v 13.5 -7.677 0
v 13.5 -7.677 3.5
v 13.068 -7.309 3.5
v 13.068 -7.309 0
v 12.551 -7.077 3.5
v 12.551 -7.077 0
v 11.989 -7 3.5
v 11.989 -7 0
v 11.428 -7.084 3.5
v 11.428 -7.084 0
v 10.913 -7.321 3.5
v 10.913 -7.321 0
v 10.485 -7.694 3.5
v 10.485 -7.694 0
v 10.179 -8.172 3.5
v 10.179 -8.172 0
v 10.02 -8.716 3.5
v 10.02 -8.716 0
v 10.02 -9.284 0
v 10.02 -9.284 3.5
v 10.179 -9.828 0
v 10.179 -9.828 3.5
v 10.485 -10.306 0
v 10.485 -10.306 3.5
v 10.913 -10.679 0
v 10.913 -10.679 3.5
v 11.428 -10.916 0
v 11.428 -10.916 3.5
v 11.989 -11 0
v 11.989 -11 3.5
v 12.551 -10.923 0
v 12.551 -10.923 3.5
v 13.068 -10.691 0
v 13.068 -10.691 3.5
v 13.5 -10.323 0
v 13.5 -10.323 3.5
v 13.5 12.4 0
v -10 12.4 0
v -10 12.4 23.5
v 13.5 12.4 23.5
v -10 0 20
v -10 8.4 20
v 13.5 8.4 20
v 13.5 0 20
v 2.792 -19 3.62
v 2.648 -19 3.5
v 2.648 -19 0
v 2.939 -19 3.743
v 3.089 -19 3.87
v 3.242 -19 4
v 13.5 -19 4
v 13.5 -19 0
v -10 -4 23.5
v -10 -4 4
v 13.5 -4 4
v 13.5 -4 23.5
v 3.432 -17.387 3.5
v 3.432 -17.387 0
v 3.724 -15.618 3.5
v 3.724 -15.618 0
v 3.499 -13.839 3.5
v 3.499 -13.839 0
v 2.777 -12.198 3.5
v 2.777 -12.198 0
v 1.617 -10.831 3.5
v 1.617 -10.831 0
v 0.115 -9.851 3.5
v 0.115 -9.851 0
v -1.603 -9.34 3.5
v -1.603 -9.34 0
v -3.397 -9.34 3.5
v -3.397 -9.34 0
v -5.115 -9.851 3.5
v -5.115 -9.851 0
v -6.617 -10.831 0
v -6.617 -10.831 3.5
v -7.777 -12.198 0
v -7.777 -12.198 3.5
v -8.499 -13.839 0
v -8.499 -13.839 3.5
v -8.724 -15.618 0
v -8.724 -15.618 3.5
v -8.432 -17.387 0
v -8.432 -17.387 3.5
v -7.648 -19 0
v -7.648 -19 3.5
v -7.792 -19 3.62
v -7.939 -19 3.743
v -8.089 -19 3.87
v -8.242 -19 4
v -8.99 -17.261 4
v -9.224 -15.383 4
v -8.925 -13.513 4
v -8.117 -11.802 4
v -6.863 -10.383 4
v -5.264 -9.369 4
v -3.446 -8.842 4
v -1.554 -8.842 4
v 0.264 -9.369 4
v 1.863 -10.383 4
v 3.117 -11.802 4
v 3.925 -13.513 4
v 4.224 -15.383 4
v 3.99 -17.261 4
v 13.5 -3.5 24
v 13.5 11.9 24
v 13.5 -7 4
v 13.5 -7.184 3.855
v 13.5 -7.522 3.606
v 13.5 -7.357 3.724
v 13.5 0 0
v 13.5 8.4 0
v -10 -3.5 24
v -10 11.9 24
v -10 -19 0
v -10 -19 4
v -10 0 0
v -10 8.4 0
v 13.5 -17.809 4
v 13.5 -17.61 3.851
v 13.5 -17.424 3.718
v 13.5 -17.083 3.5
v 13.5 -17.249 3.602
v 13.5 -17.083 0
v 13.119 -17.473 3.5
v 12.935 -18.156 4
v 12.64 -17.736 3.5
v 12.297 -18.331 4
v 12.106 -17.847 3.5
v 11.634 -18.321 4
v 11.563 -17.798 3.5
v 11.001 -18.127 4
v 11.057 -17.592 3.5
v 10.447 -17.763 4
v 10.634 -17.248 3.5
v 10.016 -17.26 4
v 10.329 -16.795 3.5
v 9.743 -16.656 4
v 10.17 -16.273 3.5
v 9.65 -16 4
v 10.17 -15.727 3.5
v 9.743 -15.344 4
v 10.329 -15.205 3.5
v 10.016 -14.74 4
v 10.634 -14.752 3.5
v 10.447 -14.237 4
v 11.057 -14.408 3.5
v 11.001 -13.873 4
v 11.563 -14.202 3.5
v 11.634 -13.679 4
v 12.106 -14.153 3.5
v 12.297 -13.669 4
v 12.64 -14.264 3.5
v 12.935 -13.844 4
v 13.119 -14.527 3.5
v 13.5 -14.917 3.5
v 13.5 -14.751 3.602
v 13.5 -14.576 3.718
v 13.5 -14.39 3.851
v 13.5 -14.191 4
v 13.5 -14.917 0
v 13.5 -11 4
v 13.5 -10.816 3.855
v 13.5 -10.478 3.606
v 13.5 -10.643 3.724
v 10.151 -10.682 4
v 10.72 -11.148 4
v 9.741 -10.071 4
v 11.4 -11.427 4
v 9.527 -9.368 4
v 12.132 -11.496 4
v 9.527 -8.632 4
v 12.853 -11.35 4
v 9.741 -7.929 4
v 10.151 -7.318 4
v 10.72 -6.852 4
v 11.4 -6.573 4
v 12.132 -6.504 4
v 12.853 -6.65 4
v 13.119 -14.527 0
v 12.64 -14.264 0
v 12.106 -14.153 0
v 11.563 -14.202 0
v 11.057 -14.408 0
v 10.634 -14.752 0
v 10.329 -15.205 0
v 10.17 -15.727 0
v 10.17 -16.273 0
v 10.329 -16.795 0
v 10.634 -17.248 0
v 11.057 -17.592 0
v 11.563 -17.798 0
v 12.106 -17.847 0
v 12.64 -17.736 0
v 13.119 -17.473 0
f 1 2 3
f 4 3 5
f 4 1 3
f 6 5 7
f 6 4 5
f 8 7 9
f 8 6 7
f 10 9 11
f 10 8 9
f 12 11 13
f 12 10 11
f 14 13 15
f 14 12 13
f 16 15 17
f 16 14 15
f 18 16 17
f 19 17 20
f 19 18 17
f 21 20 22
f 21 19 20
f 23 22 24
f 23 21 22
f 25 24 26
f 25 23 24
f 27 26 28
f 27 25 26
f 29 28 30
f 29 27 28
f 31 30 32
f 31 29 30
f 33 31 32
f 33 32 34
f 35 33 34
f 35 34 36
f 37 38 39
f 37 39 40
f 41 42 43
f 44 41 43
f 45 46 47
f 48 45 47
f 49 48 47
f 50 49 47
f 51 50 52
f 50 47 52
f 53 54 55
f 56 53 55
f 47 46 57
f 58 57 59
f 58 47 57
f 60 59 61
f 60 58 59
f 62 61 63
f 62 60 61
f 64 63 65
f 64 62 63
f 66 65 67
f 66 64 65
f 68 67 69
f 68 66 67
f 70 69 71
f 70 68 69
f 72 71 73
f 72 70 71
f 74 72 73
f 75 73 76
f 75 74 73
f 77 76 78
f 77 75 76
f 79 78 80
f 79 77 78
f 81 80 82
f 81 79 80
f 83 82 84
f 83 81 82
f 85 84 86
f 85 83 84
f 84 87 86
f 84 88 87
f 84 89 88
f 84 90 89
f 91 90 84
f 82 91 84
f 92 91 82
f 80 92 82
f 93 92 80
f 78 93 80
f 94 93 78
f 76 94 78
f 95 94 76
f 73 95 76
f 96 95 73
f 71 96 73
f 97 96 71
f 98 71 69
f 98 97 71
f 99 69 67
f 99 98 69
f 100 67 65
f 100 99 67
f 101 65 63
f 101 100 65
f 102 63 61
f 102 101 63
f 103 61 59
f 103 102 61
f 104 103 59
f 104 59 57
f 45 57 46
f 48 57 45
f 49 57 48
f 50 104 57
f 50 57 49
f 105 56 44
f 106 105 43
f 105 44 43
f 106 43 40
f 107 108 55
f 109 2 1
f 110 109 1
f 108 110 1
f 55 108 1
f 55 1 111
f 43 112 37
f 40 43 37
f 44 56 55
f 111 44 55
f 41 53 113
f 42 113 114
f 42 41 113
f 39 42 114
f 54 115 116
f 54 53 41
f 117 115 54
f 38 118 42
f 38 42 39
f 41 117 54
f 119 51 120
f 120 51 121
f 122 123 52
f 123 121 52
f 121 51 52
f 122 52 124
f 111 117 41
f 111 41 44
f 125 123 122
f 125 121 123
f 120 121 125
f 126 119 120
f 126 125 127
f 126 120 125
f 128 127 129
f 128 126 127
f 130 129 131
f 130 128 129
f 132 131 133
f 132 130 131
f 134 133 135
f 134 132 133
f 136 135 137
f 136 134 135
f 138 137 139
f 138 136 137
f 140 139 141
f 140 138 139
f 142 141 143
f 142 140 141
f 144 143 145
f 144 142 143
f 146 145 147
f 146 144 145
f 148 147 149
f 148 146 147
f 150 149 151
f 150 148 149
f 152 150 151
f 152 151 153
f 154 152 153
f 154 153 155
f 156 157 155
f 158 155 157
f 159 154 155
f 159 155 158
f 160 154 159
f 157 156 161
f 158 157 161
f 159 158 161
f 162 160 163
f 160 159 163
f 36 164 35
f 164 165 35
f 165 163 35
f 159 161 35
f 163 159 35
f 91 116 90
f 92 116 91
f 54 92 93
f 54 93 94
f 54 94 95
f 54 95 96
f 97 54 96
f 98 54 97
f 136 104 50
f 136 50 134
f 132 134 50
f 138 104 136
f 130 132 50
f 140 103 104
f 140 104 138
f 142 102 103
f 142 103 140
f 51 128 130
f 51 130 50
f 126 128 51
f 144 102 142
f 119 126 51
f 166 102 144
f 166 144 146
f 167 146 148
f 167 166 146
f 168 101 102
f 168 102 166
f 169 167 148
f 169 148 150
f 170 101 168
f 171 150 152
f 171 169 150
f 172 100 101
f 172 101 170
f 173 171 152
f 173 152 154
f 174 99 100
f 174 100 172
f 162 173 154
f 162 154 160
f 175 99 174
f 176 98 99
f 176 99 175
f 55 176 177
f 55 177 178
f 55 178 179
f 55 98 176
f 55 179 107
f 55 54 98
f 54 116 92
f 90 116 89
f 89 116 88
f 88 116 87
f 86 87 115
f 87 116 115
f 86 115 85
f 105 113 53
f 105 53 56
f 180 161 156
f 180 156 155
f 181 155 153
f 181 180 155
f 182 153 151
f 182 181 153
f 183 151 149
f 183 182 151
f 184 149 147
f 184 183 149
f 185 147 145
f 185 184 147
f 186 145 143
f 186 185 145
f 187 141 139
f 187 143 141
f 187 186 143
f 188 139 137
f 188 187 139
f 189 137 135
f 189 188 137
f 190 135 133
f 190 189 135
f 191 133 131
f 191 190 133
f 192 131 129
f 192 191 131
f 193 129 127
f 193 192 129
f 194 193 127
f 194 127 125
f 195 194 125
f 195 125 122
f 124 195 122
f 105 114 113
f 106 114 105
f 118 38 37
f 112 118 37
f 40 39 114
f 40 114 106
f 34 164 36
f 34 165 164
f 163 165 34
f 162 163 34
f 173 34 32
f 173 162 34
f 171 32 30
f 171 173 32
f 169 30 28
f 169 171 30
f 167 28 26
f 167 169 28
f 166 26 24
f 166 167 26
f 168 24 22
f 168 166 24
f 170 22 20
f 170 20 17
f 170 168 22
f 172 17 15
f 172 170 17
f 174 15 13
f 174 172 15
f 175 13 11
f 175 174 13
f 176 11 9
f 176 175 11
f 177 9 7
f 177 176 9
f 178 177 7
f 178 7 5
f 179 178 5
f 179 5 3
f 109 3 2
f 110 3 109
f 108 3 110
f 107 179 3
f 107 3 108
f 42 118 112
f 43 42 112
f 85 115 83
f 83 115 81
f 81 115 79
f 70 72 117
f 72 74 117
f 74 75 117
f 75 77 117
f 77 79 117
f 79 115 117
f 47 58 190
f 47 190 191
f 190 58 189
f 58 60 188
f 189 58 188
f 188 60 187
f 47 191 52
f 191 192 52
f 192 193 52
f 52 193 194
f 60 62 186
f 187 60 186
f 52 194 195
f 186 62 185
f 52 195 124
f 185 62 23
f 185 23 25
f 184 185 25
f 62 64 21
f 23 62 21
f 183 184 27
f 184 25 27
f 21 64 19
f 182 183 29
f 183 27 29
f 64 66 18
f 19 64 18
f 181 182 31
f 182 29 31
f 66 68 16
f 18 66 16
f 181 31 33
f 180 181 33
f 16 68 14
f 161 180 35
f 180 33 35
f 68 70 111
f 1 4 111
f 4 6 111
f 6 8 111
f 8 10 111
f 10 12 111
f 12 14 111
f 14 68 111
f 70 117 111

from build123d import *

# Parameters (mm, degrees)
BOX_W             = 31
BOX_H             = 8.4
BOX_DEPTH         = 20
CYLINDER_R        = 6.225
CYLINDER_DEPTH    = 10
CYLINDER001_R     = 2
CYLINDER001_DEPTH = 10
CYLINDER002_R     = 1.85
CYLINDER002_DEPTH = 10
BOX003_W          = 23.5
BOX003_H          = 4
BOX003_DEPTH      = 24
BOX002_W          = 23.5
BOX002_H          = 16
BOX002_DEPTH      = 4
BOX001_W          = 23.5
BOX001_H          = 4
BOX001_DEPTH      = 24
BOX004_W          = 23.5
BOX004_H          = 14
BOX004_DEPTH      = 4
CHAMFER_SIZE      = 0.5
CHAMFER001_SIZE   = 0.5


with BuildPart() as glass:
    # Box → Box (new body)
    with BuildSketch(Plane(origin=(-10, 0, 0), x_dir=(1, 0, 0), z_dir=(0, 0, 1))):
        with Locations((15.5, 4.2)):
            Rectangle(BOX_W, BOX_H)
    extrude(amount=BOX_DEPTH)


with BuildPart() as ph_tube:
    # Cylinder → Cylinder (new body)
    with BuildSketch(Plane(origin=(-2.5, -15.5, 0), x_dir=(1, 0, 0), z_dir=(0, 0, 1))):
        Circle(CYLINDER_R)
    extrude(amount=CYLINDER_DEPTH)


with BuildPart() as temp_tube:
    # Cylinder001 → Cylinder001 (new body)
    with BuildSketch(Plane(origin=(12, -9, 0), x_dir=(1, 0, 0), z_dir=(0, 0, 1))):
        Circle(CYLINDER001_R)
    extrude(amount=CYLINDER001_DEPTH)


with BuildPart() as tds_tube:
    # Cylinder002 → Cylinder002 (new body)
    with BuildSketch(Plane(origin=(12, -16, 0), x_dir=(1, 0, 0), z_dir=(0, 0, 1))):
        Circle(CYLINDER002_R)
    extrude(amount=CYLINDER002_DEPTH)


with BuildPart() as back:
    # Box003 → Box003 (new body)
    with BuildSketch(Plane(origin=(-10, 8.4, 0), x_dir=(1, 0, 0), z_dir=(0, 0, 1))):
        with Locations((11.75, 2)):
            Rectangle(BOX003_W, BOX003_H)
    extrude(amount=BOX003_DEPTH)


with BuildPart() as bottom:
    # Box002 → Box002 (new body)
    with BuildSketch(Plane(origin=(-10, -19, 0), x_dir=(1, 0, 0), z_dir=(0, 0, 1))):
        with Locations((11.75, 8)):
            Rectangle(BOX002_W, BOX002_H)
    extrude(amount=BOX002_DEPTH)


with BuildPart() as front:
    # Box001 → Box001 (new body)
    with BuildSketch(Plane(origin=(-10, -4, 0), x_dir=(1, 0, 0), z_dir=(0, 0, 1))):
        with Locations((11.75, 2)):
            Rectangle(BOX001_W, BOX001_H)
    extrude(amount=BOX001_DEPTH)


with BuildPart() as chamfer001:
    # Box004 → Box004 (new body)
    with BuildSketch(Plane(origin=(-10, -4, 20), x_dir=(1, 0, 0), z_dir=(0, 0, 1))):
        with Locations((11.75, 7)):
            Rectangle(BOX004_W, BOX004_H)
    extrude(amount=BOX004_DEPTH)

    # Fusion: union Back, Bottom, Front
    add(back.part)
    add(bottom.part)
    add(front.part)

    # Cut: cut TDS_tube
    add(tds_tube.part, mode=Mode.SUBTRACT)

    # Cut001: cut Temp_tube
    add(temp_tube.part, mode=Mode.SUBTRACT)

    # Cut002: cut pH_tube
    add(ph_tube.part, mode=Mode.SUBTRACT)

    # Cut003: cut Glass
    add(glass.part, mode=Mode.SUBTRACT)

    # Chamfer
    chamfer_edges = [chamfer001.edges().sort_by_distance(p)[0] for p in [
        (10, -9, 4),
        (10.15, -16, 4),
        (3.449628, -17.330997, 4),
        (-4.330997, -9.550372, 4),
    ]]
    chamfer(chamfer_edges, length=CHAMFER_SIZE)

    # Chamfer001
    chamfer001_edges = [chamfer001.edges().sort_by_distance(p)[0] for p in [
        (1.75, -4, 24),
        (1.75, 12.4, 24),
    ]]
    chamfer(chamfer001_edges, length=CHAMFER001_SIZE)


solid = chamfer001.part
